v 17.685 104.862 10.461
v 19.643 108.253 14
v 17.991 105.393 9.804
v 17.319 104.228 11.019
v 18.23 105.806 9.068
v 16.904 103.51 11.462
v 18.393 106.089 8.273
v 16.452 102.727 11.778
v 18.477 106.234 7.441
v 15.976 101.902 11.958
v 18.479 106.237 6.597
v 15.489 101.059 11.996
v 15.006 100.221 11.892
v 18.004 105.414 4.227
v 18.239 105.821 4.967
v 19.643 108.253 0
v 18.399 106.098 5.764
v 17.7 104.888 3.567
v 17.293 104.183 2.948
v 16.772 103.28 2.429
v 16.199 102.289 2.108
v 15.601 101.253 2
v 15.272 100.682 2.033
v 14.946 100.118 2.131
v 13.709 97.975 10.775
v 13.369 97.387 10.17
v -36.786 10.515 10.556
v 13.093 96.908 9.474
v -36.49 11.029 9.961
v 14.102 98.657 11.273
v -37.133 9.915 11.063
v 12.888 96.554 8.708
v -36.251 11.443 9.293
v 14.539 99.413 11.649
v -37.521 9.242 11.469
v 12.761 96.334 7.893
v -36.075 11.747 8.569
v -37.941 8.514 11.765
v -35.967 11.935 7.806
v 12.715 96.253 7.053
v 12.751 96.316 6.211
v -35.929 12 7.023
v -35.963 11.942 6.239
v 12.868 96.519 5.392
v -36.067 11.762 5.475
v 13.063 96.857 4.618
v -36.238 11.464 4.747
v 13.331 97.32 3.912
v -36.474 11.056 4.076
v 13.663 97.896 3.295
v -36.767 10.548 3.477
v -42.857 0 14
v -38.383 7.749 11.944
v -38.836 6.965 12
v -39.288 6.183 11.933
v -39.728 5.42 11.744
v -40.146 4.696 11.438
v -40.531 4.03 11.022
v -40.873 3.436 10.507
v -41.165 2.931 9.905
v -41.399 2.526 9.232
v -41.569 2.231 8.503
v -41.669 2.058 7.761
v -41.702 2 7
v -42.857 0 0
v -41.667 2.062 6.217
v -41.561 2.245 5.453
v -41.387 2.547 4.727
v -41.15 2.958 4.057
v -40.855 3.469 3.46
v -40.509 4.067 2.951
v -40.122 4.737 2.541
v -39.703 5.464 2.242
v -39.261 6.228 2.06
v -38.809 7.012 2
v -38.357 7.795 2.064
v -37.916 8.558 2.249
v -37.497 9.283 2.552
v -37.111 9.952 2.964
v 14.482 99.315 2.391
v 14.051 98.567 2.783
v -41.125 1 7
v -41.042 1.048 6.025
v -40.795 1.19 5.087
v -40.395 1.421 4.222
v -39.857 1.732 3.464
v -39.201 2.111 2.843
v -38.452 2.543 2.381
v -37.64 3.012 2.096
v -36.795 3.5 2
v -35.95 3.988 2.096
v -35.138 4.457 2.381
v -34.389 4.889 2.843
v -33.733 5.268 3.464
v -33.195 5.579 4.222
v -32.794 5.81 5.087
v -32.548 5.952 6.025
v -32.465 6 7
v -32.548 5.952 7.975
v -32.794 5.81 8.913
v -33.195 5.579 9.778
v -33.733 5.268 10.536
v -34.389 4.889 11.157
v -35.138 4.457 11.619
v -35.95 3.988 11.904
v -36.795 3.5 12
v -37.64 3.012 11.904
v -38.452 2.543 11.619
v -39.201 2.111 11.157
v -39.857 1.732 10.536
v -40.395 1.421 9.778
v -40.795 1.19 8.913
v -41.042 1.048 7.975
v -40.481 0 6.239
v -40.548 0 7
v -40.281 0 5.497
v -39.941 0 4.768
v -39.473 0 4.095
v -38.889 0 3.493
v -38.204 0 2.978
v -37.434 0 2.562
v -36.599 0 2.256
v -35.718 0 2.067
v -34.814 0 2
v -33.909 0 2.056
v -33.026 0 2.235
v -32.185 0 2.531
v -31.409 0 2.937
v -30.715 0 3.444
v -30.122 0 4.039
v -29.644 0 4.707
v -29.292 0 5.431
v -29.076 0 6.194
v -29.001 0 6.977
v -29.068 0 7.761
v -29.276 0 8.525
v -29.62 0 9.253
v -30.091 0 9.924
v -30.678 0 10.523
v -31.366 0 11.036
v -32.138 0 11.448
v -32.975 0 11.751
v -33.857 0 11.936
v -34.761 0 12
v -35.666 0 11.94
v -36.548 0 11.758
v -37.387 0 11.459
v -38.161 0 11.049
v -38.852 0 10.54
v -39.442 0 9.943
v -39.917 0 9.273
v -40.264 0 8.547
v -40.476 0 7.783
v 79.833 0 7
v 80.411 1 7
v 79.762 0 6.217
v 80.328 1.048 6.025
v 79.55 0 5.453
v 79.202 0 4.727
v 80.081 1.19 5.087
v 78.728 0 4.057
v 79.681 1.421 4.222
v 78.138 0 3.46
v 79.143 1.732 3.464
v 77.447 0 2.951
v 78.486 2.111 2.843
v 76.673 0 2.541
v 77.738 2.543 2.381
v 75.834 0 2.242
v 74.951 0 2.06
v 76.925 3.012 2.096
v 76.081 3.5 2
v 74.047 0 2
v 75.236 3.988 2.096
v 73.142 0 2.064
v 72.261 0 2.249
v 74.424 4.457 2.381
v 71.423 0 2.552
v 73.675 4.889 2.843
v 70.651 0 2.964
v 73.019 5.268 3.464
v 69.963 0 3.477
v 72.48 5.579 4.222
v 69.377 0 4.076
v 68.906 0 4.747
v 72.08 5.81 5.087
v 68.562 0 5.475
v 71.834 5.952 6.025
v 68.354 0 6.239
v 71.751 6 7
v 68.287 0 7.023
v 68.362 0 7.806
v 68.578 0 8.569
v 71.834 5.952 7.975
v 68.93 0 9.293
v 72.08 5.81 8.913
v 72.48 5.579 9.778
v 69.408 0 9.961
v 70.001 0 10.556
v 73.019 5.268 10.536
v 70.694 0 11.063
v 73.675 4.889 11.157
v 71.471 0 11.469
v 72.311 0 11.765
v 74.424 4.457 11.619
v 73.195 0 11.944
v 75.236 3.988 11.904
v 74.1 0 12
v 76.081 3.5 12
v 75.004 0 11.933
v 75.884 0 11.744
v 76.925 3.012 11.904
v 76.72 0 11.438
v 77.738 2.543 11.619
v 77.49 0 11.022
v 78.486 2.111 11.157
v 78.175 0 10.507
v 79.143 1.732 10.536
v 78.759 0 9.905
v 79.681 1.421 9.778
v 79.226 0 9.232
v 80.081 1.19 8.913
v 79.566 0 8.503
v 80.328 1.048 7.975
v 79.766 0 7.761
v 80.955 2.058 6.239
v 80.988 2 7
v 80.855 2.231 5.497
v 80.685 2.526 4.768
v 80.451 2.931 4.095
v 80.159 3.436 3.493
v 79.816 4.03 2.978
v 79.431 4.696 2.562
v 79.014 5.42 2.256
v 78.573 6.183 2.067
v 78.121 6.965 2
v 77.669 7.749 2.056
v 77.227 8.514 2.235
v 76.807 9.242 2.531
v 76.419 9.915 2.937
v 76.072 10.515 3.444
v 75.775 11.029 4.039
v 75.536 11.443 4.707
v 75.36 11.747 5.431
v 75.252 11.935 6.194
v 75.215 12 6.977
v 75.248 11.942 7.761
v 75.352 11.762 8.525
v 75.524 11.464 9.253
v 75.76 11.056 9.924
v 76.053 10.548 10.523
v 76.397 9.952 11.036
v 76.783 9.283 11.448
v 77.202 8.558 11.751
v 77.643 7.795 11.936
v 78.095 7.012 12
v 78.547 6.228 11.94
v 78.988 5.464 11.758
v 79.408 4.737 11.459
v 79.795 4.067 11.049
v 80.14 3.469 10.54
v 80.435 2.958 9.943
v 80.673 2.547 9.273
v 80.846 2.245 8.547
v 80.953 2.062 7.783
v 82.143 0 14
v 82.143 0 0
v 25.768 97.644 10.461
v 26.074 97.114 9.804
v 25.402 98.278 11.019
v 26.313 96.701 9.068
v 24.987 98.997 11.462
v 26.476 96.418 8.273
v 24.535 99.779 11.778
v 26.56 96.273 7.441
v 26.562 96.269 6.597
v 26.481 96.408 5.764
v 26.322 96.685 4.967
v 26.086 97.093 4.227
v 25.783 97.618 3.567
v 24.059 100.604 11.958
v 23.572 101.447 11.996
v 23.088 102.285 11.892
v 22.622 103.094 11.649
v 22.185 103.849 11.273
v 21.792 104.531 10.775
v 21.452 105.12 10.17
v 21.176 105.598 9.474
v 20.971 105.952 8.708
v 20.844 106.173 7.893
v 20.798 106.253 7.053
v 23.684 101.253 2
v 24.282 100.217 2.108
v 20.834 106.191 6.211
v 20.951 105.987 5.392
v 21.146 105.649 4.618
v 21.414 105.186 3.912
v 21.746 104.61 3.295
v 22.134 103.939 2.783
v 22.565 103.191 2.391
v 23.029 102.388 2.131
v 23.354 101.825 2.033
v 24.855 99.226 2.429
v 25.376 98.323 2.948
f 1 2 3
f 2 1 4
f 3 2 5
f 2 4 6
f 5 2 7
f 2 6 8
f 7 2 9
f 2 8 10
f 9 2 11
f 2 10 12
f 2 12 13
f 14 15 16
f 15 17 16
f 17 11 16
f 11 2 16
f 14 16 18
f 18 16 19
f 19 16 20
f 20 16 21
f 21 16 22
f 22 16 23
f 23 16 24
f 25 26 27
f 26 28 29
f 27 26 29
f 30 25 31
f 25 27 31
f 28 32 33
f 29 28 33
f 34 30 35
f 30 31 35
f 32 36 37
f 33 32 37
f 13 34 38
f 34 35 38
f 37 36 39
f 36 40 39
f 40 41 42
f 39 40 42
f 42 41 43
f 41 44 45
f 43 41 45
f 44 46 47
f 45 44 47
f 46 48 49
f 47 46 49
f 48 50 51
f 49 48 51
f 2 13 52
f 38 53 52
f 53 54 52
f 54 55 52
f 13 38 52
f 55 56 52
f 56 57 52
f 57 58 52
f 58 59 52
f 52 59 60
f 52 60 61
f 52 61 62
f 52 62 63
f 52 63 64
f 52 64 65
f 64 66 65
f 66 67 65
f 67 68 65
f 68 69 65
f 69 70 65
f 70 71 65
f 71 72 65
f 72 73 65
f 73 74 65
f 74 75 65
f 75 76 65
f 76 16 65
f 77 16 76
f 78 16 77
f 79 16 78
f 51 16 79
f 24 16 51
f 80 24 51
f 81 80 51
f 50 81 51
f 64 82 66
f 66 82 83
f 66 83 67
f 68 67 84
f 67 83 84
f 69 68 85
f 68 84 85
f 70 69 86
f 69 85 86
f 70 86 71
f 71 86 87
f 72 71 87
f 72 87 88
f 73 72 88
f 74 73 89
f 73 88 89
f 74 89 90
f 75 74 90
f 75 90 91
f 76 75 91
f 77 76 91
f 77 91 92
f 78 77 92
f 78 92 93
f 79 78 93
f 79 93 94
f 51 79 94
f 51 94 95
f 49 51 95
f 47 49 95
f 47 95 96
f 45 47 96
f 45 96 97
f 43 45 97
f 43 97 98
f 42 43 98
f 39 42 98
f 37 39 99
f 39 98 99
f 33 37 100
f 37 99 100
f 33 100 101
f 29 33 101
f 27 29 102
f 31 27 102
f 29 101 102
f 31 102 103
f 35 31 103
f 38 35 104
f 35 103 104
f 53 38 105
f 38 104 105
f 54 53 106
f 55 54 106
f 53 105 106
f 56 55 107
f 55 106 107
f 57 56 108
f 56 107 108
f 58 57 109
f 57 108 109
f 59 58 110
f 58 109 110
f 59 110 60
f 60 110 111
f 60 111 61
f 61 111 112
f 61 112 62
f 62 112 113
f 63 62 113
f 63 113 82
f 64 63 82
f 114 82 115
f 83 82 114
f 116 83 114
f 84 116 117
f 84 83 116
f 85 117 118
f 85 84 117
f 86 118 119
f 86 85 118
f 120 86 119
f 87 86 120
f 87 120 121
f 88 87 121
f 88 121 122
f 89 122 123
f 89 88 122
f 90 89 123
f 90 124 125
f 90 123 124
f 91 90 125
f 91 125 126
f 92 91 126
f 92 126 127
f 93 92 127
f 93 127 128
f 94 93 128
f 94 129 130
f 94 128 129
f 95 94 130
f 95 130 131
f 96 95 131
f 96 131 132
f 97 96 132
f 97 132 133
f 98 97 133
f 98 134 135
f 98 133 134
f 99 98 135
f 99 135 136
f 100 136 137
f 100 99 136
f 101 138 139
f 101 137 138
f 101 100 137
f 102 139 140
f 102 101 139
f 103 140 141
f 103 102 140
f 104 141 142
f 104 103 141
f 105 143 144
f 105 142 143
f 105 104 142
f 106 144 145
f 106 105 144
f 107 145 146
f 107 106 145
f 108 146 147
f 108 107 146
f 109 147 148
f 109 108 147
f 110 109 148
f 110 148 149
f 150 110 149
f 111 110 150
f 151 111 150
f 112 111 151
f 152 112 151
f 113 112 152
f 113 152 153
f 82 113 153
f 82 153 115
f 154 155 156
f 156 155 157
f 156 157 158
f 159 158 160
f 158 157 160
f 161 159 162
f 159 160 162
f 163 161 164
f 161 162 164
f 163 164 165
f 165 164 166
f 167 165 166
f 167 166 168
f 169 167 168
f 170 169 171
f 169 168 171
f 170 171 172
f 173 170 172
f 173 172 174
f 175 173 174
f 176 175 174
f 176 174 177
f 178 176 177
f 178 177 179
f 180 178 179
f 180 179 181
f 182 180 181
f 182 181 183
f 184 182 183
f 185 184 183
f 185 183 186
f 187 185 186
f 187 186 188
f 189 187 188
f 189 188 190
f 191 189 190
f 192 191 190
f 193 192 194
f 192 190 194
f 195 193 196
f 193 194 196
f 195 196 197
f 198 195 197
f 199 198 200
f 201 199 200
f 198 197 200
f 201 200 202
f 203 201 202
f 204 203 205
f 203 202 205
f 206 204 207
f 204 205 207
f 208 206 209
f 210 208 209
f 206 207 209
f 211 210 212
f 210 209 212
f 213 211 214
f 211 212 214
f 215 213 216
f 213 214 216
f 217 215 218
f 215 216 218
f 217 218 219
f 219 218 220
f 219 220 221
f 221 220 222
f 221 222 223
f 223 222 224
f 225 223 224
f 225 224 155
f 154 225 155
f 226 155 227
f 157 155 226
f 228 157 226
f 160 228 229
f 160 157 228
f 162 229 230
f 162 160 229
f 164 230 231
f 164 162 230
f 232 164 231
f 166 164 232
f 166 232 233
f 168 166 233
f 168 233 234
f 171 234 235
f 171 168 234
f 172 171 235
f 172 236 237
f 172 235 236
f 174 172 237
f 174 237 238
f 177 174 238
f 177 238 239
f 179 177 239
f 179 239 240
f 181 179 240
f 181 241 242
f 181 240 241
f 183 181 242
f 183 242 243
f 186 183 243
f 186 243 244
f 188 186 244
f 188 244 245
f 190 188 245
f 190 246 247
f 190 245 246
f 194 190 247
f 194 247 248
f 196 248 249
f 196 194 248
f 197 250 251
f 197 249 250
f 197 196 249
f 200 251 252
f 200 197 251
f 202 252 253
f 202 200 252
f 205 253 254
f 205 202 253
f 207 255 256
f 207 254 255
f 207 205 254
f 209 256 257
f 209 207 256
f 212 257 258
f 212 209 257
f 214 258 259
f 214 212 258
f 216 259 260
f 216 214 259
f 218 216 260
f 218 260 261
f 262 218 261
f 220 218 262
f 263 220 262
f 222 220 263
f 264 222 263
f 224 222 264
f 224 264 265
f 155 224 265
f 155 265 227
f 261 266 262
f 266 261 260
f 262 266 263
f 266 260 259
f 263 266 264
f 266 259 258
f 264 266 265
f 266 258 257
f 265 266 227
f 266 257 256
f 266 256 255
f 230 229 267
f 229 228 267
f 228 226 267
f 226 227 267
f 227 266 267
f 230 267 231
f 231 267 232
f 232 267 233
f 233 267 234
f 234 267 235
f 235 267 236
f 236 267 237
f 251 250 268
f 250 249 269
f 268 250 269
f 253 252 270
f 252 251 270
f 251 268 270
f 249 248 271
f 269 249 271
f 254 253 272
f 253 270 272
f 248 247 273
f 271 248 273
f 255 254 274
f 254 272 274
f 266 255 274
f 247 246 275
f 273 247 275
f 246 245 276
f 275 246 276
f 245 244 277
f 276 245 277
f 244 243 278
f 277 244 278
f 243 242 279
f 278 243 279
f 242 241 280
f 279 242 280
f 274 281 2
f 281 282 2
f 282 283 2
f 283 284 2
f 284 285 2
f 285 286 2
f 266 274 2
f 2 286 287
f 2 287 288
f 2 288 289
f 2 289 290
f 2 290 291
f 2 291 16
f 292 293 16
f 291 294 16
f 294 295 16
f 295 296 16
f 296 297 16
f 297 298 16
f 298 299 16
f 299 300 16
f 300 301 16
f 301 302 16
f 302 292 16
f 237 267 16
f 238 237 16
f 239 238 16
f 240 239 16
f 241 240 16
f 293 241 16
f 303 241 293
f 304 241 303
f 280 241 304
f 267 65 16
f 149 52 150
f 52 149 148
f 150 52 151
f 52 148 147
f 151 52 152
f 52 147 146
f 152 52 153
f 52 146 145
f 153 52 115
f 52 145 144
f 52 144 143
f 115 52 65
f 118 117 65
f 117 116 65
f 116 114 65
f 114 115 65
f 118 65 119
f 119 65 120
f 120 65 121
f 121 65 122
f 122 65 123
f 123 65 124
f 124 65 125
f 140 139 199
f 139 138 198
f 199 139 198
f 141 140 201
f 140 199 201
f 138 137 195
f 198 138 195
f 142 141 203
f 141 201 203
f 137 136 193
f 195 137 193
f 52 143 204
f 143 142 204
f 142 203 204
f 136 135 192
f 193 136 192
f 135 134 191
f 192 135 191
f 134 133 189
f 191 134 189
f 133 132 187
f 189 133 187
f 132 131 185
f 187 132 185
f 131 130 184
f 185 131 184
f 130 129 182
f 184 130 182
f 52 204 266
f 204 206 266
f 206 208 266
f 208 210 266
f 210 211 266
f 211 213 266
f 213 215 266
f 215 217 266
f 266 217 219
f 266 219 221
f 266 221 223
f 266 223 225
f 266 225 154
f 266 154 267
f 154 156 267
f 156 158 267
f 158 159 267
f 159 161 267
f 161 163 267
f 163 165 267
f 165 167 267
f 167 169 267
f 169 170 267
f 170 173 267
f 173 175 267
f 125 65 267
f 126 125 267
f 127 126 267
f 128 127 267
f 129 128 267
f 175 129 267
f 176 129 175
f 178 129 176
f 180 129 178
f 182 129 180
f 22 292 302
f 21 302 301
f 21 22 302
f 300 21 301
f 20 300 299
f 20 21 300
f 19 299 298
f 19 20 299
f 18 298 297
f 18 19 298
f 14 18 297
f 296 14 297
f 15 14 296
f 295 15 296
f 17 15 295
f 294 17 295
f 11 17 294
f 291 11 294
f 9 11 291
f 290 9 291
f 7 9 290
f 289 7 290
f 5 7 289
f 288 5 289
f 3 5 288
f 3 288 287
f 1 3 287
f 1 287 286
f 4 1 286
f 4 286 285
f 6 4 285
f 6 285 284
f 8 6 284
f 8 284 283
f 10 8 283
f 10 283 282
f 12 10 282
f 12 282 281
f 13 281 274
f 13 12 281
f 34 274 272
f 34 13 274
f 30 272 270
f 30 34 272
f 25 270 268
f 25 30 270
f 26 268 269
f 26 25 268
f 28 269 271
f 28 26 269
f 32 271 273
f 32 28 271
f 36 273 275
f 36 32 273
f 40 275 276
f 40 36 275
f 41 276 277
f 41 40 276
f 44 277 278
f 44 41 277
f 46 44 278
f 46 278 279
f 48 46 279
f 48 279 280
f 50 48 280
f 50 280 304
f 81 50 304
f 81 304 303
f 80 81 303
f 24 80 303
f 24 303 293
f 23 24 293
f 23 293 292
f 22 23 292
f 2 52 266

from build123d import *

# Parameters (mm, degrees)
BOSS_EXTRUDE1_DEPTH     = 14
SKETCH2_R               = 5
CUT_EXTRUDE1_DEPTH      = 50
CUT_EXTRUDE3_DEPTH      = 50
CUT_EXTRUDE3_DEPTH_BACK = 50
SKETCH5_R               = 5
CUT_EXTRUDE4_DEPTH      = 50
CUT_EXTRUDE4_DEPTH_BACK = 50
SKETCH6_R               = 5


with BuildPart() as part:
    # Sketch1 → Boss-Extrude1 (new body)
    with BuildSketch(Plane.XY):
        Polygon((-42.857142857, 0), (82.142857143, 0), (19.642857143, 108.253175473), align=None)
    extrude(amount=BOSS_EXTRUDE1_DEPTH)

    # Sketch2 → Cut-Extrude1 (cut)
    with BuildSketch(Plane(origin=(0, 0, 0), x_dir=(0, 0, -1), z_dir=(1, 0, 0))):
        with Locations((-7, 101.253175473)):
            Circle(SKETCH2_R)
    extrude(amount=CUT_EXTRUDE1_DEPTH, mode=Mode.SUBTRACT)

    # Sketch5 → Cut-Extrude3 (cut, two sides: drawn at the far end of the back side and taken through both)
    with BuildSketch(Plane(origin=(-10.714285714, 18.557687224, 0), x_dir=(-0.8660254037844386, -0.5000000000000003, 0), z_dir=(0.5000000000000003, -0.8660254037844386, 0)).offset(-CUT_EXTRUDE3_DEPTH_BACK)):
        with Locations((30.115374448, -7)):
            Circle(SKETCH5_R)
    extrude(amount=CUT_EXTRUDE3_DEPTH + CUT_EXTRUDE3_DEPTH_BACK, mode=Mode.SUBTRACT)

    # Sketch6 → Cut-Extrude4 (cut, two sides: drawn at the far end of the back side and taken through both)
    with BuildSketch(Plane(origin=(20.535714286, 35.568900513, 0), x_dir=(0.8660254037844386, -0.5000000000000003, 0), z_dir=(0.5000000000000003, 0.8660254037844386, 0)).offset(-CUT_EXTRUDE4_DEPTH_BACK)):
        with Locations((64.137801025, -7)):
            Circle(SKETCH6_R)
    extrude(amount=CUT_EXTRUDE4_DEPTH + CUT_EXTRUDE4_DEPTH_BACK, mode=Mode.SUBTRACT)


solid = part.part
